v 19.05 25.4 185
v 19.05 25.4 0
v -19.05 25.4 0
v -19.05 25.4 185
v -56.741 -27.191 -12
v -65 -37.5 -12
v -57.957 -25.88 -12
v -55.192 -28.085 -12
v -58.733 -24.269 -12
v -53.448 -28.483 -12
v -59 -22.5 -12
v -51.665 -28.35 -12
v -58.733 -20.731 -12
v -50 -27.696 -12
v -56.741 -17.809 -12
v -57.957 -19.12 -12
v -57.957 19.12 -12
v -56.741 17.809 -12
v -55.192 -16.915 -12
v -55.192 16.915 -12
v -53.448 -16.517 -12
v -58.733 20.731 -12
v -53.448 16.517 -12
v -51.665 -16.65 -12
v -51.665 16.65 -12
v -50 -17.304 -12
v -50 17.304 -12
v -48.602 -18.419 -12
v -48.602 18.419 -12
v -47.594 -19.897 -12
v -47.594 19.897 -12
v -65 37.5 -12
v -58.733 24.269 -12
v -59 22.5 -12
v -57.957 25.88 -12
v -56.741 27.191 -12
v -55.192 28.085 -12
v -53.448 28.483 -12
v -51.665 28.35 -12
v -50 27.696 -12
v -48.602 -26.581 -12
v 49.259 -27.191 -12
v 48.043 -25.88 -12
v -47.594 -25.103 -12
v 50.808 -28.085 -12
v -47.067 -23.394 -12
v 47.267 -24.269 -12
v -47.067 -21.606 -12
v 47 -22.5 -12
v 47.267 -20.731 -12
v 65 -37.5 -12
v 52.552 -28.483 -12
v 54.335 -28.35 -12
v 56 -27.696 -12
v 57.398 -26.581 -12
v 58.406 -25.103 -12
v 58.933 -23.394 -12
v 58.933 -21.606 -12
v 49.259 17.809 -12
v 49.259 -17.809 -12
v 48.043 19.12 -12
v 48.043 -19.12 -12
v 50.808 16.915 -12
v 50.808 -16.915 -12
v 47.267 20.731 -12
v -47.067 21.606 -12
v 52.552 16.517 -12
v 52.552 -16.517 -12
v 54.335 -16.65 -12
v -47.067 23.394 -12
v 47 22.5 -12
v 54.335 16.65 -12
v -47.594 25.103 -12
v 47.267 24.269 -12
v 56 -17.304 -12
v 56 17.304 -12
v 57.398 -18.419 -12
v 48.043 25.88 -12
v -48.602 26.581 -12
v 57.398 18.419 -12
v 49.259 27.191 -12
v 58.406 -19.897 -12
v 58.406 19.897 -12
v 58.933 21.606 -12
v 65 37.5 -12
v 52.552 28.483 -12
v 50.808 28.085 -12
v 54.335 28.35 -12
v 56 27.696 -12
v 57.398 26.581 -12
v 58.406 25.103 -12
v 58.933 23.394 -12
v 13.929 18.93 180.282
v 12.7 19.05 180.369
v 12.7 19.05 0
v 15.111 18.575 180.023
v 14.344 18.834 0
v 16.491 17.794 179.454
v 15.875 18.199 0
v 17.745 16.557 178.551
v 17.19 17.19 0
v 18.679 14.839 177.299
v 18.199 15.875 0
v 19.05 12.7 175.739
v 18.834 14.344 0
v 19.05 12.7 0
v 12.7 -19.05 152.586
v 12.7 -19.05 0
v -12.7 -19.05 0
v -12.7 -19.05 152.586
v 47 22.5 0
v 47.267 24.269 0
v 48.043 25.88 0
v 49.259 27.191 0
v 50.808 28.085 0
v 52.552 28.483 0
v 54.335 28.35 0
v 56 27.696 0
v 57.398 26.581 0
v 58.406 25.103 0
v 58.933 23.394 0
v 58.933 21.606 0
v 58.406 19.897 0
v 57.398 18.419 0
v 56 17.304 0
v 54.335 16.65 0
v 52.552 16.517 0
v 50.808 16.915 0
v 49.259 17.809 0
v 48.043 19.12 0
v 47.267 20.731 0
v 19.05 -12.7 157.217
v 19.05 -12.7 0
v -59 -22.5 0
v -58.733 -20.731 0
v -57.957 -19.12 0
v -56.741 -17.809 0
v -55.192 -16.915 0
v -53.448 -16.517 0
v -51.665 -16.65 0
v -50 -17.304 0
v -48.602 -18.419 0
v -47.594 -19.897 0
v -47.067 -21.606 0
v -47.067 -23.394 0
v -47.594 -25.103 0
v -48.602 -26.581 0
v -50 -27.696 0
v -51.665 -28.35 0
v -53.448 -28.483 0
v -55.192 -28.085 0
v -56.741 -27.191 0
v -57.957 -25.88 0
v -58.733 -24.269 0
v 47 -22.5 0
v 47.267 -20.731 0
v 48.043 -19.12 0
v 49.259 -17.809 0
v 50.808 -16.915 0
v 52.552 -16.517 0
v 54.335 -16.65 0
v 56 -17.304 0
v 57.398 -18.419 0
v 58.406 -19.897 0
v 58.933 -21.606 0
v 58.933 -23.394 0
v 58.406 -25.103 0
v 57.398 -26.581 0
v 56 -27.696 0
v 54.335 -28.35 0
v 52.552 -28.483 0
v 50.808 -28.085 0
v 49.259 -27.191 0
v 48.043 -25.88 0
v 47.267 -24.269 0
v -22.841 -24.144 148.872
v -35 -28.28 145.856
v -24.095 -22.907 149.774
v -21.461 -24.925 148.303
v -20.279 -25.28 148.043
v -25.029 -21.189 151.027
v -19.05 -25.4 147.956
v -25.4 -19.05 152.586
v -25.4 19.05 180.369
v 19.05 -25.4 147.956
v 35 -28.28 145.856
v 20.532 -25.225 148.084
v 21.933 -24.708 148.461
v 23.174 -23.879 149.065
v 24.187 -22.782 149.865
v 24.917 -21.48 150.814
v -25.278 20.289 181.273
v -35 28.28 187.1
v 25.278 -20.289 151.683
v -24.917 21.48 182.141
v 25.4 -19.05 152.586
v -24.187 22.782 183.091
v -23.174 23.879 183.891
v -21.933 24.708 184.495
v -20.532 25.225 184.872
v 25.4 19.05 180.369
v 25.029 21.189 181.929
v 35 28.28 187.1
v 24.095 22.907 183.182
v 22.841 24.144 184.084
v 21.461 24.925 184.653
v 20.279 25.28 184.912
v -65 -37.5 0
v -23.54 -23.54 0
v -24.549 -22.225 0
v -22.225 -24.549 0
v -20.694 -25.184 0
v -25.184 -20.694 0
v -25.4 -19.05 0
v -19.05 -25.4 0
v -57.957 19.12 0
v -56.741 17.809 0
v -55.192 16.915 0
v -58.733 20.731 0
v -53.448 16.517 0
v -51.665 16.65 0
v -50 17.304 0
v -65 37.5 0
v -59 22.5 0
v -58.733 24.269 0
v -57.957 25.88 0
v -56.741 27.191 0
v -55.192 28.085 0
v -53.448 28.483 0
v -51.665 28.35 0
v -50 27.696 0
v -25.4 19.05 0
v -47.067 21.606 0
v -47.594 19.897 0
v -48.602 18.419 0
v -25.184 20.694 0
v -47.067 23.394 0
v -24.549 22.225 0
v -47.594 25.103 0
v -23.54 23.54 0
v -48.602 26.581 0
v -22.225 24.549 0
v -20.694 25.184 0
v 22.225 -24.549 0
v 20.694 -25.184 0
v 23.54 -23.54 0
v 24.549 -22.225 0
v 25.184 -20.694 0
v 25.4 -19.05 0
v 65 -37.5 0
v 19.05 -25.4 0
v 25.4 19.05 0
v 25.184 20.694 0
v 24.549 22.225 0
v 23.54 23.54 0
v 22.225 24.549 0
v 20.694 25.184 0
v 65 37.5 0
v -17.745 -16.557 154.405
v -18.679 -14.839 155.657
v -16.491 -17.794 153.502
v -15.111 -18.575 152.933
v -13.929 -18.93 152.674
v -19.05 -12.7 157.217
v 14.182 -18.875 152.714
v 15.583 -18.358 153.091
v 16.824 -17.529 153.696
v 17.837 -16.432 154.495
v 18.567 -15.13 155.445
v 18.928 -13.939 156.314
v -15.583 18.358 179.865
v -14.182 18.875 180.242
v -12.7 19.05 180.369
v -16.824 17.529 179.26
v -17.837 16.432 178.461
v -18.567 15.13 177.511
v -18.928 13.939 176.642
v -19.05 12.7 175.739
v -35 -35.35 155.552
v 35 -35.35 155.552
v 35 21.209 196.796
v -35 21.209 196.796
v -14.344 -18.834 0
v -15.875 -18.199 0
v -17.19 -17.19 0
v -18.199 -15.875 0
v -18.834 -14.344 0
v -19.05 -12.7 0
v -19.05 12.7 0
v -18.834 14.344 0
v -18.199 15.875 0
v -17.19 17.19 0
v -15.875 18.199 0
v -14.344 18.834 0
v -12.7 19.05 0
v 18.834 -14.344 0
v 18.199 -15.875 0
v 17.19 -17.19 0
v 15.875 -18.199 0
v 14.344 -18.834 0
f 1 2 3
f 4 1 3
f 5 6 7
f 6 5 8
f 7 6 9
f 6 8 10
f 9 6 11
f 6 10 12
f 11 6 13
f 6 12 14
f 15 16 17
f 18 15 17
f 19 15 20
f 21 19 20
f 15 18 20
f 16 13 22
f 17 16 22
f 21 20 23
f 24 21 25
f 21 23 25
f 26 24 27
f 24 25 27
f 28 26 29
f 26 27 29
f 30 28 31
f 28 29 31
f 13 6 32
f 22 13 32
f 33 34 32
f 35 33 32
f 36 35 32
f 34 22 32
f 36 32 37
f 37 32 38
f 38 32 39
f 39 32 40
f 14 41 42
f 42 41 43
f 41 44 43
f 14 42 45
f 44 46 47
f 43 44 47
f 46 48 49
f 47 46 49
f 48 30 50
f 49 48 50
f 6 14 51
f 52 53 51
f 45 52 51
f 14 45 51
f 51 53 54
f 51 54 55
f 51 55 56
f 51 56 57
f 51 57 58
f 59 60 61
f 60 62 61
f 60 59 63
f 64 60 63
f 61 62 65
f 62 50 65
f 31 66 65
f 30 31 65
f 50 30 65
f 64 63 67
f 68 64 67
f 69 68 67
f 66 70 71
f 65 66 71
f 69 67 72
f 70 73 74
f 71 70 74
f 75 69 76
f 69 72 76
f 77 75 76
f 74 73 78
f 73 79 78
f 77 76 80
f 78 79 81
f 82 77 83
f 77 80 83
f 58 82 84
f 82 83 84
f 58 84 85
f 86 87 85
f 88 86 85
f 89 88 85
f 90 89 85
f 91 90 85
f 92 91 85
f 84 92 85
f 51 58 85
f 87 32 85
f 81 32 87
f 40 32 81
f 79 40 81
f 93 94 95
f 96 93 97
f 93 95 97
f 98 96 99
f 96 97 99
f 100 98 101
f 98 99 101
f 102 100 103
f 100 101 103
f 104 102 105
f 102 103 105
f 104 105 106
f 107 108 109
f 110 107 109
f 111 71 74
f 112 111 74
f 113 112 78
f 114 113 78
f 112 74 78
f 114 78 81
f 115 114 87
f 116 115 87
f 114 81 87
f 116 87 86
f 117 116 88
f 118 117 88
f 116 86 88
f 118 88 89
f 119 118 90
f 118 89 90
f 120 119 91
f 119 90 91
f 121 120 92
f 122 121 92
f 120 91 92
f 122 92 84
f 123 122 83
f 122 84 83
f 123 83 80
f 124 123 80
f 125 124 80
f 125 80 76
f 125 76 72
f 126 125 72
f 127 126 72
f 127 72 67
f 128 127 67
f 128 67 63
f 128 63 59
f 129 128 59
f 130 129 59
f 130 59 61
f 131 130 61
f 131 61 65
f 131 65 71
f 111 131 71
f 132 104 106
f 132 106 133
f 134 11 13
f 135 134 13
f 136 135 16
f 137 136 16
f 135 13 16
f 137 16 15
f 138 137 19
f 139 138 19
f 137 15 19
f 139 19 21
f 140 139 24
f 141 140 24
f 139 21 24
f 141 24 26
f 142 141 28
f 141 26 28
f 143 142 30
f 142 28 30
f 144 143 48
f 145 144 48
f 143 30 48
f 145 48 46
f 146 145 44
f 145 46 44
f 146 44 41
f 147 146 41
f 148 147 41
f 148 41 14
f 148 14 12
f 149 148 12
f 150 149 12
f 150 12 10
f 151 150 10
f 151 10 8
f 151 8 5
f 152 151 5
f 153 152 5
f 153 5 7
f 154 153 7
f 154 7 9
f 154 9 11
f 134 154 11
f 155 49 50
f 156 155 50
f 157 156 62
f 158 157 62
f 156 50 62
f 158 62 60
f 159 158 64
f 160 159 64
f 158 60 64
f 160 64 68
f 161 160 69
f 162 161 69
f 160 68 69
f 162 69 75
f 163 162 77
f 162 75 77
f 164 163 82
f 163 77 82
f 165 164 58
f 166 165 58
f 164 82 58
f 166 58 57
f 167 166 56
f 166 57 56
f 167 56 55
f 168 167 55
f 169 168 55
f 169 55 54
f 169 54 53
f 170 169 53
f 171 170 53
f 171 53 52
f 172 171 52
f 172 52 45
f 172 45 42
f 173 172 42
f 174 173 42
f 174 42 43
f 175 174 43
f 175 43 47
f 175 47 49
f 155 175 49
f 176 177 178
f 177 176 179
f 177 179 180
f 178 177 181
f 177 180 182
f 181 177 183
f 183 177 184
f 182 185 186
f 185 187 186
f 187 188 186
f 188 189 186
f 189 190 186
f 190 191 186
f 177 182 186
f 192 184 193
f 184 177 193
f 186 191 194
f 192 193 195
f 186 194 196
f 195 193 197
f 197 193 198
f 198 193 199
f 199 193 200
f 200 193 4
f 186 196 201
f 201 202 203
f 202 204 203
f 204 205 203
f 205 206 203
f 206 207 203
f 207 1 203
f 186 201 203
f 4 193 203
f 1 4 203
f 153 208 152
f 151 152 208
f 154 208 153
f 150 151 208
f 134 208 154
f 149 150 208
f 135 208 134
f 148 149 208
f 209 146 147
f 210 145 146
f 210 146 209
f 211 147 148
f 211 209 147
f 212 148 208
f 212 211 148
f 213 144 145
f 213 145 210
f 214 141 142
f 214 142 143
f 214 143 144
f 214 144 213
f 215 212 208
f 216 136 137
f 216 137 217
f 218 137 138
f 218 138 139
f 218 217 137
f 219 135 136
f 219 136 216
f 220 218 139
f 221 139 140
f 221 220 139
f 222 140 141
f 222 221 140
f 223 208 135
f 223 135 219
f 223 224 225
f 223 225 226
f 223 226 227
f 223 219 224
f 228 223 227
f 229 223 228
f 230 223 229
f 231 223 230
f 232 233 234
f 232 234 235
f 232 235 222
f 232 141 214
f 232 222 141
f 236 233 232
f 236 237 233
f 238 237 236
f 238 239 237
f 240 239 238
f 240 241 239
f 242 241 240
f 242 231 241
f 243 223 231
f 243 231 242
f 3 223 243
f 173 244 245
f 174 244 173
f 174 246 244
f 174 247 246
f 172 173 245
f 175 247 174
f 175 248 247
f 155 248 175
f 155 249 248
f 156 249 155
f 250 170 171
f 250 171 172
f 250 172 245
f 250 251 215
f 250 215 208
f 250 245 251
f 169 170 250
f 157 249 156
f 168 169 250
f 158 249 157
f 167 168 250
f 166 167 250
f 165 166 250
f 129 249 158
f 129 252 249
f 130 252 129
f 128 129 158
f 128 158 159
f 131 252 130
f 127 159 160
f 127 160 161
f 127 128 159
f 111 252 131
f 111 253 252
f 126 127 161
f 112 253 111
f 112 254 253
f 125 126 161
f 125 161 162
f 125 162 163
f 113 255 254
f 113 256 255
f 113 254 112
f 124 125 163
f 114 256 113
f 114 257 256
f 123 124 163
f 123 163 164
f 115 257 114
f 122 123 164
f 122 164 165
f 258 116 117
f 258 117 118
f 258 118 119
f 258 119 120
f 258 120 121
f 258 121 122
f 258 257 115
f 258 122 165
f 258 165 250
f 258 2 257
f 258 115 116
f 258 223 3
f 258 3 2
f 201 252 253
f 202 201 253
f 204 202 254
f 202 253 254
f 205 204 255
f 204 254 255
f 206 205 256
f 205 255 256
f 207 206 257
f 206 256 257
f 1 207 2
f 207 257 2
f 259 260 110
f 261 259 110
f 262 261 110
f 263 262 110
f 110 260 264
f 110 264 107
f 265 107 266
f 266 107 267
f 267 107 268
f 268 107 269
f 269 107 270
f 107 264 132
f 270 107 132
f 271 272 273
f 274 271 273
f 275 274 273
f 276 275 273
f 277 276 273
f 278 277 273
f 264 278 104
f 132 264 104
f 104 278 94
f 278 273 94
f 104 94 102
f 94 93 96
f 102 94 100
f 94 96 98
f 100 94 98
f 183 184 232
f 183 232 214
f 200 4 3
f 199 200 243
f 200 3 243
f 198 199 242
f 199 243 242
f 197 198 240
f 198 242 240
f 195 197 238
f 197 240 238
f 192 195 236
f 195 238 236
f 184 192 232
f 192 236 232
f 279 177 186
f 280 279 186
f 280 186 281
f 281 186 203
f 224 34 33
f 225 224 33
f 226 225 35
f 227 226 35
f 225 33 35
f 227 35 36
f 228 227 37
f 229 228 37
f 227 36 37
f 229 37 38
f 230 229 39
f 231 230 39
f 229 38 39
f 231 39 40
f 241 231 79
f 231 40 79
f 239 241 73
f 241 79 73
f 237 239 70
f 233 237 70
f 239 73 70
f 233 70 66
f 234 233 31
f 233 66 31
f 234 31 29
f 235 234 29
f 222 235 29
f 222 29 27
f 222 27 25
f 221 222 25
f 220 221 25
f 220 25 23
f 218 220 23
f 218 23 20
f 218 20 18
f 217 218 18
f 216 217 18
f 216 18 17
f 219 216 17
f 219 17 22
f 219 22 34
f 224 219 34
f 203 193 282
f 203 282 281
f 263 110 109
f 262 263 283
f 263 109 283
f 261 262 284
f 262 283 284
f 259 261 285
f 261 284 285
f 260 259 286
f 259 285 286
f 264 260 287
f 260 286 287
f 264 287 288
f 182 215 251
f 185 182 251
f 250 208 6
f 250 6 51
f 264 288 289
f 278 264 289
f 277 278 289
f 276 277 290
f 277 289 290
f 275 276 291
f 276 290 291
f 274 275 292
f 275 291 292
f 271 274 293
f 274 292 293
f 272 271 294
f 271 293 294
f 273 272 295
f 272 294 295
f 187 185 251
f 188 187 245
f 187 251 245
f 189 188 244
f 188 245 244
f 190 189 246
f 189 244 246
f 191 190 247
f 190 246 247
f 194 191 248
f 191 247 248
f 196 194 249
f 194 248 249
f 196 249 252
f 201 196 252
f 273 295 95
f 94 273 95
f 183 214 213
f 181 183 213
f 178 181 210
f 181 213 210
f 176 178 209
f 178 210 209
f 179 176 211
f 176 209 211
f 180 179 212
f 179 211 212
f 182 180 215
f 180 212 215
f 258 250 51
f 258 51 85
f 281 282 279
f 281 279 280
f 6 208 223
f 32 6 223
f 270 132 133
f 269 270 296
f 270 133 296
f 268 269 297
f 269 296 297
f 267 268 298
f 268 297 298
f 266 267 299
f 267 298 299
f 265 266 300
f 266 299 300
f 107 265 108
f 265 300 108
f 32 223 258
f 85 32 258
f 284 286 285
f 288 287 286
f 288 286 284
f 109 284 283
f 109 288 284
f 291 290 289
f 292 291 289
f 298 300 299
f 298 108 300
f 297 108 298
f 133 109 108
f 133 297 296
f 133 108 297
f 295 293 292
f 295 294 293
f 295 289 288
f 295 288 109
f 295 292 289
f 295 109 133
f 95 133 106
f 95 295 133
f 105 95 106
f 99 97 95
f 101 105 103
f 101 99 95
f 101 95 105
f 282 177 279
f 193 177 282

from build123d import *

# Parameters (mm, degrees)
F0_W     = 130
F0_H     = 75
F1_DEPTH = 12
F3_DEPTH = 185
F5_D     = 12
F7_DEPTH = 50.8
F8_W     = 70
F8_H     = 70
F9_DEPTH = 12


with BuildPart() as f1:
    # F0 (on Top) → F1 (new body)
    with BuildSketch(Plane.XY):
        Rectangle(F0_W, F0_H)
    extrude(amount=-F1_DEPTH)

    # F2 (on face) → F3 (join)
    with BuildSketch(Plane.XY):
        with BuildLine():
            Line((-19.05, -25.4), (19.05, -25.4))
            ThreePointArc((19.05, -25.4), (23.540128, -23.540128), (25.4, -19.05))
            Line((25.4, -19.05), (25.4, 19.05))
            ThreePointArc((25.4, 19.05), (23.540128, 23.540128), (19.05, 25.4))
            Line((19.05, 25.4), (-19.05, 25.4))
            ThreePointArc((-19.05, 25.4), (-23.540128, 23.540128), (-25.4, 19.05))
            Line((-25.4, 19.05), (-25.4, -19.05))
            ThreePointArc((-25.4, -19.05), (-23.540128, -23.540128), (-19.05, -25.4))
        make_face()
        with BuildLine():
            Line((-12.7, 19.05), (12.7, 19.05))
            ThreePointArc((12.7, 19.05), (17.190128, 17.190128), (19.05, 12.7))
            Line((19.05, 12.7), (19.05, -12.7))
            ThreePointArc((19.05, -12.7), (17.190128, -17.190128), (12.7, -19.05))
            Line((12.7, -19.05), (-12.7, -19.05))
            ThreePointArc((-12.7, -19.05), (-17.190128, -17.190128), (-19.05, -12.7))
            Line((-19.05, -12.7), (-19.05, 12.7))
            ThreePointArc((-19.05, 12.7), (-17.190128, 17.190128), (-12.7, 19.05))
        make_face(mode=Mode.SUBTRACT)
    extrude(amount=F3_DEPTH)

    # F5 (through all)
    with Locations(Plane.XY):
        with Locations((-53, 22.5), (53, 22.5), (53, -22.5), (-53, -22.5)):
            Hole(F5_D / 2)

    # F6 (on face) → F7 (cut)
    with BuildSketch(Plane.YZ.offset(25.4)):
        Polygon((25.4, 185), (-25.4, 185), (-25.4, 147.956003), align=None)
    extrude(amount=-F7_DEPTH, mode=Mode.SUBTRACT)

    # F8 (on face) → F9 (join)
    with BuildSketch(Plane(origin=(0, -79.254299, 108.684772), x_dir=(1, 0, 0), z_dir=(0, -0.589196, 0.80799))):
        with Locations((0, 98.088232)):
            Rectangle(F8_W, F8_H)
    extrude(amount=F9_DEPTH)


solid = f1.part
